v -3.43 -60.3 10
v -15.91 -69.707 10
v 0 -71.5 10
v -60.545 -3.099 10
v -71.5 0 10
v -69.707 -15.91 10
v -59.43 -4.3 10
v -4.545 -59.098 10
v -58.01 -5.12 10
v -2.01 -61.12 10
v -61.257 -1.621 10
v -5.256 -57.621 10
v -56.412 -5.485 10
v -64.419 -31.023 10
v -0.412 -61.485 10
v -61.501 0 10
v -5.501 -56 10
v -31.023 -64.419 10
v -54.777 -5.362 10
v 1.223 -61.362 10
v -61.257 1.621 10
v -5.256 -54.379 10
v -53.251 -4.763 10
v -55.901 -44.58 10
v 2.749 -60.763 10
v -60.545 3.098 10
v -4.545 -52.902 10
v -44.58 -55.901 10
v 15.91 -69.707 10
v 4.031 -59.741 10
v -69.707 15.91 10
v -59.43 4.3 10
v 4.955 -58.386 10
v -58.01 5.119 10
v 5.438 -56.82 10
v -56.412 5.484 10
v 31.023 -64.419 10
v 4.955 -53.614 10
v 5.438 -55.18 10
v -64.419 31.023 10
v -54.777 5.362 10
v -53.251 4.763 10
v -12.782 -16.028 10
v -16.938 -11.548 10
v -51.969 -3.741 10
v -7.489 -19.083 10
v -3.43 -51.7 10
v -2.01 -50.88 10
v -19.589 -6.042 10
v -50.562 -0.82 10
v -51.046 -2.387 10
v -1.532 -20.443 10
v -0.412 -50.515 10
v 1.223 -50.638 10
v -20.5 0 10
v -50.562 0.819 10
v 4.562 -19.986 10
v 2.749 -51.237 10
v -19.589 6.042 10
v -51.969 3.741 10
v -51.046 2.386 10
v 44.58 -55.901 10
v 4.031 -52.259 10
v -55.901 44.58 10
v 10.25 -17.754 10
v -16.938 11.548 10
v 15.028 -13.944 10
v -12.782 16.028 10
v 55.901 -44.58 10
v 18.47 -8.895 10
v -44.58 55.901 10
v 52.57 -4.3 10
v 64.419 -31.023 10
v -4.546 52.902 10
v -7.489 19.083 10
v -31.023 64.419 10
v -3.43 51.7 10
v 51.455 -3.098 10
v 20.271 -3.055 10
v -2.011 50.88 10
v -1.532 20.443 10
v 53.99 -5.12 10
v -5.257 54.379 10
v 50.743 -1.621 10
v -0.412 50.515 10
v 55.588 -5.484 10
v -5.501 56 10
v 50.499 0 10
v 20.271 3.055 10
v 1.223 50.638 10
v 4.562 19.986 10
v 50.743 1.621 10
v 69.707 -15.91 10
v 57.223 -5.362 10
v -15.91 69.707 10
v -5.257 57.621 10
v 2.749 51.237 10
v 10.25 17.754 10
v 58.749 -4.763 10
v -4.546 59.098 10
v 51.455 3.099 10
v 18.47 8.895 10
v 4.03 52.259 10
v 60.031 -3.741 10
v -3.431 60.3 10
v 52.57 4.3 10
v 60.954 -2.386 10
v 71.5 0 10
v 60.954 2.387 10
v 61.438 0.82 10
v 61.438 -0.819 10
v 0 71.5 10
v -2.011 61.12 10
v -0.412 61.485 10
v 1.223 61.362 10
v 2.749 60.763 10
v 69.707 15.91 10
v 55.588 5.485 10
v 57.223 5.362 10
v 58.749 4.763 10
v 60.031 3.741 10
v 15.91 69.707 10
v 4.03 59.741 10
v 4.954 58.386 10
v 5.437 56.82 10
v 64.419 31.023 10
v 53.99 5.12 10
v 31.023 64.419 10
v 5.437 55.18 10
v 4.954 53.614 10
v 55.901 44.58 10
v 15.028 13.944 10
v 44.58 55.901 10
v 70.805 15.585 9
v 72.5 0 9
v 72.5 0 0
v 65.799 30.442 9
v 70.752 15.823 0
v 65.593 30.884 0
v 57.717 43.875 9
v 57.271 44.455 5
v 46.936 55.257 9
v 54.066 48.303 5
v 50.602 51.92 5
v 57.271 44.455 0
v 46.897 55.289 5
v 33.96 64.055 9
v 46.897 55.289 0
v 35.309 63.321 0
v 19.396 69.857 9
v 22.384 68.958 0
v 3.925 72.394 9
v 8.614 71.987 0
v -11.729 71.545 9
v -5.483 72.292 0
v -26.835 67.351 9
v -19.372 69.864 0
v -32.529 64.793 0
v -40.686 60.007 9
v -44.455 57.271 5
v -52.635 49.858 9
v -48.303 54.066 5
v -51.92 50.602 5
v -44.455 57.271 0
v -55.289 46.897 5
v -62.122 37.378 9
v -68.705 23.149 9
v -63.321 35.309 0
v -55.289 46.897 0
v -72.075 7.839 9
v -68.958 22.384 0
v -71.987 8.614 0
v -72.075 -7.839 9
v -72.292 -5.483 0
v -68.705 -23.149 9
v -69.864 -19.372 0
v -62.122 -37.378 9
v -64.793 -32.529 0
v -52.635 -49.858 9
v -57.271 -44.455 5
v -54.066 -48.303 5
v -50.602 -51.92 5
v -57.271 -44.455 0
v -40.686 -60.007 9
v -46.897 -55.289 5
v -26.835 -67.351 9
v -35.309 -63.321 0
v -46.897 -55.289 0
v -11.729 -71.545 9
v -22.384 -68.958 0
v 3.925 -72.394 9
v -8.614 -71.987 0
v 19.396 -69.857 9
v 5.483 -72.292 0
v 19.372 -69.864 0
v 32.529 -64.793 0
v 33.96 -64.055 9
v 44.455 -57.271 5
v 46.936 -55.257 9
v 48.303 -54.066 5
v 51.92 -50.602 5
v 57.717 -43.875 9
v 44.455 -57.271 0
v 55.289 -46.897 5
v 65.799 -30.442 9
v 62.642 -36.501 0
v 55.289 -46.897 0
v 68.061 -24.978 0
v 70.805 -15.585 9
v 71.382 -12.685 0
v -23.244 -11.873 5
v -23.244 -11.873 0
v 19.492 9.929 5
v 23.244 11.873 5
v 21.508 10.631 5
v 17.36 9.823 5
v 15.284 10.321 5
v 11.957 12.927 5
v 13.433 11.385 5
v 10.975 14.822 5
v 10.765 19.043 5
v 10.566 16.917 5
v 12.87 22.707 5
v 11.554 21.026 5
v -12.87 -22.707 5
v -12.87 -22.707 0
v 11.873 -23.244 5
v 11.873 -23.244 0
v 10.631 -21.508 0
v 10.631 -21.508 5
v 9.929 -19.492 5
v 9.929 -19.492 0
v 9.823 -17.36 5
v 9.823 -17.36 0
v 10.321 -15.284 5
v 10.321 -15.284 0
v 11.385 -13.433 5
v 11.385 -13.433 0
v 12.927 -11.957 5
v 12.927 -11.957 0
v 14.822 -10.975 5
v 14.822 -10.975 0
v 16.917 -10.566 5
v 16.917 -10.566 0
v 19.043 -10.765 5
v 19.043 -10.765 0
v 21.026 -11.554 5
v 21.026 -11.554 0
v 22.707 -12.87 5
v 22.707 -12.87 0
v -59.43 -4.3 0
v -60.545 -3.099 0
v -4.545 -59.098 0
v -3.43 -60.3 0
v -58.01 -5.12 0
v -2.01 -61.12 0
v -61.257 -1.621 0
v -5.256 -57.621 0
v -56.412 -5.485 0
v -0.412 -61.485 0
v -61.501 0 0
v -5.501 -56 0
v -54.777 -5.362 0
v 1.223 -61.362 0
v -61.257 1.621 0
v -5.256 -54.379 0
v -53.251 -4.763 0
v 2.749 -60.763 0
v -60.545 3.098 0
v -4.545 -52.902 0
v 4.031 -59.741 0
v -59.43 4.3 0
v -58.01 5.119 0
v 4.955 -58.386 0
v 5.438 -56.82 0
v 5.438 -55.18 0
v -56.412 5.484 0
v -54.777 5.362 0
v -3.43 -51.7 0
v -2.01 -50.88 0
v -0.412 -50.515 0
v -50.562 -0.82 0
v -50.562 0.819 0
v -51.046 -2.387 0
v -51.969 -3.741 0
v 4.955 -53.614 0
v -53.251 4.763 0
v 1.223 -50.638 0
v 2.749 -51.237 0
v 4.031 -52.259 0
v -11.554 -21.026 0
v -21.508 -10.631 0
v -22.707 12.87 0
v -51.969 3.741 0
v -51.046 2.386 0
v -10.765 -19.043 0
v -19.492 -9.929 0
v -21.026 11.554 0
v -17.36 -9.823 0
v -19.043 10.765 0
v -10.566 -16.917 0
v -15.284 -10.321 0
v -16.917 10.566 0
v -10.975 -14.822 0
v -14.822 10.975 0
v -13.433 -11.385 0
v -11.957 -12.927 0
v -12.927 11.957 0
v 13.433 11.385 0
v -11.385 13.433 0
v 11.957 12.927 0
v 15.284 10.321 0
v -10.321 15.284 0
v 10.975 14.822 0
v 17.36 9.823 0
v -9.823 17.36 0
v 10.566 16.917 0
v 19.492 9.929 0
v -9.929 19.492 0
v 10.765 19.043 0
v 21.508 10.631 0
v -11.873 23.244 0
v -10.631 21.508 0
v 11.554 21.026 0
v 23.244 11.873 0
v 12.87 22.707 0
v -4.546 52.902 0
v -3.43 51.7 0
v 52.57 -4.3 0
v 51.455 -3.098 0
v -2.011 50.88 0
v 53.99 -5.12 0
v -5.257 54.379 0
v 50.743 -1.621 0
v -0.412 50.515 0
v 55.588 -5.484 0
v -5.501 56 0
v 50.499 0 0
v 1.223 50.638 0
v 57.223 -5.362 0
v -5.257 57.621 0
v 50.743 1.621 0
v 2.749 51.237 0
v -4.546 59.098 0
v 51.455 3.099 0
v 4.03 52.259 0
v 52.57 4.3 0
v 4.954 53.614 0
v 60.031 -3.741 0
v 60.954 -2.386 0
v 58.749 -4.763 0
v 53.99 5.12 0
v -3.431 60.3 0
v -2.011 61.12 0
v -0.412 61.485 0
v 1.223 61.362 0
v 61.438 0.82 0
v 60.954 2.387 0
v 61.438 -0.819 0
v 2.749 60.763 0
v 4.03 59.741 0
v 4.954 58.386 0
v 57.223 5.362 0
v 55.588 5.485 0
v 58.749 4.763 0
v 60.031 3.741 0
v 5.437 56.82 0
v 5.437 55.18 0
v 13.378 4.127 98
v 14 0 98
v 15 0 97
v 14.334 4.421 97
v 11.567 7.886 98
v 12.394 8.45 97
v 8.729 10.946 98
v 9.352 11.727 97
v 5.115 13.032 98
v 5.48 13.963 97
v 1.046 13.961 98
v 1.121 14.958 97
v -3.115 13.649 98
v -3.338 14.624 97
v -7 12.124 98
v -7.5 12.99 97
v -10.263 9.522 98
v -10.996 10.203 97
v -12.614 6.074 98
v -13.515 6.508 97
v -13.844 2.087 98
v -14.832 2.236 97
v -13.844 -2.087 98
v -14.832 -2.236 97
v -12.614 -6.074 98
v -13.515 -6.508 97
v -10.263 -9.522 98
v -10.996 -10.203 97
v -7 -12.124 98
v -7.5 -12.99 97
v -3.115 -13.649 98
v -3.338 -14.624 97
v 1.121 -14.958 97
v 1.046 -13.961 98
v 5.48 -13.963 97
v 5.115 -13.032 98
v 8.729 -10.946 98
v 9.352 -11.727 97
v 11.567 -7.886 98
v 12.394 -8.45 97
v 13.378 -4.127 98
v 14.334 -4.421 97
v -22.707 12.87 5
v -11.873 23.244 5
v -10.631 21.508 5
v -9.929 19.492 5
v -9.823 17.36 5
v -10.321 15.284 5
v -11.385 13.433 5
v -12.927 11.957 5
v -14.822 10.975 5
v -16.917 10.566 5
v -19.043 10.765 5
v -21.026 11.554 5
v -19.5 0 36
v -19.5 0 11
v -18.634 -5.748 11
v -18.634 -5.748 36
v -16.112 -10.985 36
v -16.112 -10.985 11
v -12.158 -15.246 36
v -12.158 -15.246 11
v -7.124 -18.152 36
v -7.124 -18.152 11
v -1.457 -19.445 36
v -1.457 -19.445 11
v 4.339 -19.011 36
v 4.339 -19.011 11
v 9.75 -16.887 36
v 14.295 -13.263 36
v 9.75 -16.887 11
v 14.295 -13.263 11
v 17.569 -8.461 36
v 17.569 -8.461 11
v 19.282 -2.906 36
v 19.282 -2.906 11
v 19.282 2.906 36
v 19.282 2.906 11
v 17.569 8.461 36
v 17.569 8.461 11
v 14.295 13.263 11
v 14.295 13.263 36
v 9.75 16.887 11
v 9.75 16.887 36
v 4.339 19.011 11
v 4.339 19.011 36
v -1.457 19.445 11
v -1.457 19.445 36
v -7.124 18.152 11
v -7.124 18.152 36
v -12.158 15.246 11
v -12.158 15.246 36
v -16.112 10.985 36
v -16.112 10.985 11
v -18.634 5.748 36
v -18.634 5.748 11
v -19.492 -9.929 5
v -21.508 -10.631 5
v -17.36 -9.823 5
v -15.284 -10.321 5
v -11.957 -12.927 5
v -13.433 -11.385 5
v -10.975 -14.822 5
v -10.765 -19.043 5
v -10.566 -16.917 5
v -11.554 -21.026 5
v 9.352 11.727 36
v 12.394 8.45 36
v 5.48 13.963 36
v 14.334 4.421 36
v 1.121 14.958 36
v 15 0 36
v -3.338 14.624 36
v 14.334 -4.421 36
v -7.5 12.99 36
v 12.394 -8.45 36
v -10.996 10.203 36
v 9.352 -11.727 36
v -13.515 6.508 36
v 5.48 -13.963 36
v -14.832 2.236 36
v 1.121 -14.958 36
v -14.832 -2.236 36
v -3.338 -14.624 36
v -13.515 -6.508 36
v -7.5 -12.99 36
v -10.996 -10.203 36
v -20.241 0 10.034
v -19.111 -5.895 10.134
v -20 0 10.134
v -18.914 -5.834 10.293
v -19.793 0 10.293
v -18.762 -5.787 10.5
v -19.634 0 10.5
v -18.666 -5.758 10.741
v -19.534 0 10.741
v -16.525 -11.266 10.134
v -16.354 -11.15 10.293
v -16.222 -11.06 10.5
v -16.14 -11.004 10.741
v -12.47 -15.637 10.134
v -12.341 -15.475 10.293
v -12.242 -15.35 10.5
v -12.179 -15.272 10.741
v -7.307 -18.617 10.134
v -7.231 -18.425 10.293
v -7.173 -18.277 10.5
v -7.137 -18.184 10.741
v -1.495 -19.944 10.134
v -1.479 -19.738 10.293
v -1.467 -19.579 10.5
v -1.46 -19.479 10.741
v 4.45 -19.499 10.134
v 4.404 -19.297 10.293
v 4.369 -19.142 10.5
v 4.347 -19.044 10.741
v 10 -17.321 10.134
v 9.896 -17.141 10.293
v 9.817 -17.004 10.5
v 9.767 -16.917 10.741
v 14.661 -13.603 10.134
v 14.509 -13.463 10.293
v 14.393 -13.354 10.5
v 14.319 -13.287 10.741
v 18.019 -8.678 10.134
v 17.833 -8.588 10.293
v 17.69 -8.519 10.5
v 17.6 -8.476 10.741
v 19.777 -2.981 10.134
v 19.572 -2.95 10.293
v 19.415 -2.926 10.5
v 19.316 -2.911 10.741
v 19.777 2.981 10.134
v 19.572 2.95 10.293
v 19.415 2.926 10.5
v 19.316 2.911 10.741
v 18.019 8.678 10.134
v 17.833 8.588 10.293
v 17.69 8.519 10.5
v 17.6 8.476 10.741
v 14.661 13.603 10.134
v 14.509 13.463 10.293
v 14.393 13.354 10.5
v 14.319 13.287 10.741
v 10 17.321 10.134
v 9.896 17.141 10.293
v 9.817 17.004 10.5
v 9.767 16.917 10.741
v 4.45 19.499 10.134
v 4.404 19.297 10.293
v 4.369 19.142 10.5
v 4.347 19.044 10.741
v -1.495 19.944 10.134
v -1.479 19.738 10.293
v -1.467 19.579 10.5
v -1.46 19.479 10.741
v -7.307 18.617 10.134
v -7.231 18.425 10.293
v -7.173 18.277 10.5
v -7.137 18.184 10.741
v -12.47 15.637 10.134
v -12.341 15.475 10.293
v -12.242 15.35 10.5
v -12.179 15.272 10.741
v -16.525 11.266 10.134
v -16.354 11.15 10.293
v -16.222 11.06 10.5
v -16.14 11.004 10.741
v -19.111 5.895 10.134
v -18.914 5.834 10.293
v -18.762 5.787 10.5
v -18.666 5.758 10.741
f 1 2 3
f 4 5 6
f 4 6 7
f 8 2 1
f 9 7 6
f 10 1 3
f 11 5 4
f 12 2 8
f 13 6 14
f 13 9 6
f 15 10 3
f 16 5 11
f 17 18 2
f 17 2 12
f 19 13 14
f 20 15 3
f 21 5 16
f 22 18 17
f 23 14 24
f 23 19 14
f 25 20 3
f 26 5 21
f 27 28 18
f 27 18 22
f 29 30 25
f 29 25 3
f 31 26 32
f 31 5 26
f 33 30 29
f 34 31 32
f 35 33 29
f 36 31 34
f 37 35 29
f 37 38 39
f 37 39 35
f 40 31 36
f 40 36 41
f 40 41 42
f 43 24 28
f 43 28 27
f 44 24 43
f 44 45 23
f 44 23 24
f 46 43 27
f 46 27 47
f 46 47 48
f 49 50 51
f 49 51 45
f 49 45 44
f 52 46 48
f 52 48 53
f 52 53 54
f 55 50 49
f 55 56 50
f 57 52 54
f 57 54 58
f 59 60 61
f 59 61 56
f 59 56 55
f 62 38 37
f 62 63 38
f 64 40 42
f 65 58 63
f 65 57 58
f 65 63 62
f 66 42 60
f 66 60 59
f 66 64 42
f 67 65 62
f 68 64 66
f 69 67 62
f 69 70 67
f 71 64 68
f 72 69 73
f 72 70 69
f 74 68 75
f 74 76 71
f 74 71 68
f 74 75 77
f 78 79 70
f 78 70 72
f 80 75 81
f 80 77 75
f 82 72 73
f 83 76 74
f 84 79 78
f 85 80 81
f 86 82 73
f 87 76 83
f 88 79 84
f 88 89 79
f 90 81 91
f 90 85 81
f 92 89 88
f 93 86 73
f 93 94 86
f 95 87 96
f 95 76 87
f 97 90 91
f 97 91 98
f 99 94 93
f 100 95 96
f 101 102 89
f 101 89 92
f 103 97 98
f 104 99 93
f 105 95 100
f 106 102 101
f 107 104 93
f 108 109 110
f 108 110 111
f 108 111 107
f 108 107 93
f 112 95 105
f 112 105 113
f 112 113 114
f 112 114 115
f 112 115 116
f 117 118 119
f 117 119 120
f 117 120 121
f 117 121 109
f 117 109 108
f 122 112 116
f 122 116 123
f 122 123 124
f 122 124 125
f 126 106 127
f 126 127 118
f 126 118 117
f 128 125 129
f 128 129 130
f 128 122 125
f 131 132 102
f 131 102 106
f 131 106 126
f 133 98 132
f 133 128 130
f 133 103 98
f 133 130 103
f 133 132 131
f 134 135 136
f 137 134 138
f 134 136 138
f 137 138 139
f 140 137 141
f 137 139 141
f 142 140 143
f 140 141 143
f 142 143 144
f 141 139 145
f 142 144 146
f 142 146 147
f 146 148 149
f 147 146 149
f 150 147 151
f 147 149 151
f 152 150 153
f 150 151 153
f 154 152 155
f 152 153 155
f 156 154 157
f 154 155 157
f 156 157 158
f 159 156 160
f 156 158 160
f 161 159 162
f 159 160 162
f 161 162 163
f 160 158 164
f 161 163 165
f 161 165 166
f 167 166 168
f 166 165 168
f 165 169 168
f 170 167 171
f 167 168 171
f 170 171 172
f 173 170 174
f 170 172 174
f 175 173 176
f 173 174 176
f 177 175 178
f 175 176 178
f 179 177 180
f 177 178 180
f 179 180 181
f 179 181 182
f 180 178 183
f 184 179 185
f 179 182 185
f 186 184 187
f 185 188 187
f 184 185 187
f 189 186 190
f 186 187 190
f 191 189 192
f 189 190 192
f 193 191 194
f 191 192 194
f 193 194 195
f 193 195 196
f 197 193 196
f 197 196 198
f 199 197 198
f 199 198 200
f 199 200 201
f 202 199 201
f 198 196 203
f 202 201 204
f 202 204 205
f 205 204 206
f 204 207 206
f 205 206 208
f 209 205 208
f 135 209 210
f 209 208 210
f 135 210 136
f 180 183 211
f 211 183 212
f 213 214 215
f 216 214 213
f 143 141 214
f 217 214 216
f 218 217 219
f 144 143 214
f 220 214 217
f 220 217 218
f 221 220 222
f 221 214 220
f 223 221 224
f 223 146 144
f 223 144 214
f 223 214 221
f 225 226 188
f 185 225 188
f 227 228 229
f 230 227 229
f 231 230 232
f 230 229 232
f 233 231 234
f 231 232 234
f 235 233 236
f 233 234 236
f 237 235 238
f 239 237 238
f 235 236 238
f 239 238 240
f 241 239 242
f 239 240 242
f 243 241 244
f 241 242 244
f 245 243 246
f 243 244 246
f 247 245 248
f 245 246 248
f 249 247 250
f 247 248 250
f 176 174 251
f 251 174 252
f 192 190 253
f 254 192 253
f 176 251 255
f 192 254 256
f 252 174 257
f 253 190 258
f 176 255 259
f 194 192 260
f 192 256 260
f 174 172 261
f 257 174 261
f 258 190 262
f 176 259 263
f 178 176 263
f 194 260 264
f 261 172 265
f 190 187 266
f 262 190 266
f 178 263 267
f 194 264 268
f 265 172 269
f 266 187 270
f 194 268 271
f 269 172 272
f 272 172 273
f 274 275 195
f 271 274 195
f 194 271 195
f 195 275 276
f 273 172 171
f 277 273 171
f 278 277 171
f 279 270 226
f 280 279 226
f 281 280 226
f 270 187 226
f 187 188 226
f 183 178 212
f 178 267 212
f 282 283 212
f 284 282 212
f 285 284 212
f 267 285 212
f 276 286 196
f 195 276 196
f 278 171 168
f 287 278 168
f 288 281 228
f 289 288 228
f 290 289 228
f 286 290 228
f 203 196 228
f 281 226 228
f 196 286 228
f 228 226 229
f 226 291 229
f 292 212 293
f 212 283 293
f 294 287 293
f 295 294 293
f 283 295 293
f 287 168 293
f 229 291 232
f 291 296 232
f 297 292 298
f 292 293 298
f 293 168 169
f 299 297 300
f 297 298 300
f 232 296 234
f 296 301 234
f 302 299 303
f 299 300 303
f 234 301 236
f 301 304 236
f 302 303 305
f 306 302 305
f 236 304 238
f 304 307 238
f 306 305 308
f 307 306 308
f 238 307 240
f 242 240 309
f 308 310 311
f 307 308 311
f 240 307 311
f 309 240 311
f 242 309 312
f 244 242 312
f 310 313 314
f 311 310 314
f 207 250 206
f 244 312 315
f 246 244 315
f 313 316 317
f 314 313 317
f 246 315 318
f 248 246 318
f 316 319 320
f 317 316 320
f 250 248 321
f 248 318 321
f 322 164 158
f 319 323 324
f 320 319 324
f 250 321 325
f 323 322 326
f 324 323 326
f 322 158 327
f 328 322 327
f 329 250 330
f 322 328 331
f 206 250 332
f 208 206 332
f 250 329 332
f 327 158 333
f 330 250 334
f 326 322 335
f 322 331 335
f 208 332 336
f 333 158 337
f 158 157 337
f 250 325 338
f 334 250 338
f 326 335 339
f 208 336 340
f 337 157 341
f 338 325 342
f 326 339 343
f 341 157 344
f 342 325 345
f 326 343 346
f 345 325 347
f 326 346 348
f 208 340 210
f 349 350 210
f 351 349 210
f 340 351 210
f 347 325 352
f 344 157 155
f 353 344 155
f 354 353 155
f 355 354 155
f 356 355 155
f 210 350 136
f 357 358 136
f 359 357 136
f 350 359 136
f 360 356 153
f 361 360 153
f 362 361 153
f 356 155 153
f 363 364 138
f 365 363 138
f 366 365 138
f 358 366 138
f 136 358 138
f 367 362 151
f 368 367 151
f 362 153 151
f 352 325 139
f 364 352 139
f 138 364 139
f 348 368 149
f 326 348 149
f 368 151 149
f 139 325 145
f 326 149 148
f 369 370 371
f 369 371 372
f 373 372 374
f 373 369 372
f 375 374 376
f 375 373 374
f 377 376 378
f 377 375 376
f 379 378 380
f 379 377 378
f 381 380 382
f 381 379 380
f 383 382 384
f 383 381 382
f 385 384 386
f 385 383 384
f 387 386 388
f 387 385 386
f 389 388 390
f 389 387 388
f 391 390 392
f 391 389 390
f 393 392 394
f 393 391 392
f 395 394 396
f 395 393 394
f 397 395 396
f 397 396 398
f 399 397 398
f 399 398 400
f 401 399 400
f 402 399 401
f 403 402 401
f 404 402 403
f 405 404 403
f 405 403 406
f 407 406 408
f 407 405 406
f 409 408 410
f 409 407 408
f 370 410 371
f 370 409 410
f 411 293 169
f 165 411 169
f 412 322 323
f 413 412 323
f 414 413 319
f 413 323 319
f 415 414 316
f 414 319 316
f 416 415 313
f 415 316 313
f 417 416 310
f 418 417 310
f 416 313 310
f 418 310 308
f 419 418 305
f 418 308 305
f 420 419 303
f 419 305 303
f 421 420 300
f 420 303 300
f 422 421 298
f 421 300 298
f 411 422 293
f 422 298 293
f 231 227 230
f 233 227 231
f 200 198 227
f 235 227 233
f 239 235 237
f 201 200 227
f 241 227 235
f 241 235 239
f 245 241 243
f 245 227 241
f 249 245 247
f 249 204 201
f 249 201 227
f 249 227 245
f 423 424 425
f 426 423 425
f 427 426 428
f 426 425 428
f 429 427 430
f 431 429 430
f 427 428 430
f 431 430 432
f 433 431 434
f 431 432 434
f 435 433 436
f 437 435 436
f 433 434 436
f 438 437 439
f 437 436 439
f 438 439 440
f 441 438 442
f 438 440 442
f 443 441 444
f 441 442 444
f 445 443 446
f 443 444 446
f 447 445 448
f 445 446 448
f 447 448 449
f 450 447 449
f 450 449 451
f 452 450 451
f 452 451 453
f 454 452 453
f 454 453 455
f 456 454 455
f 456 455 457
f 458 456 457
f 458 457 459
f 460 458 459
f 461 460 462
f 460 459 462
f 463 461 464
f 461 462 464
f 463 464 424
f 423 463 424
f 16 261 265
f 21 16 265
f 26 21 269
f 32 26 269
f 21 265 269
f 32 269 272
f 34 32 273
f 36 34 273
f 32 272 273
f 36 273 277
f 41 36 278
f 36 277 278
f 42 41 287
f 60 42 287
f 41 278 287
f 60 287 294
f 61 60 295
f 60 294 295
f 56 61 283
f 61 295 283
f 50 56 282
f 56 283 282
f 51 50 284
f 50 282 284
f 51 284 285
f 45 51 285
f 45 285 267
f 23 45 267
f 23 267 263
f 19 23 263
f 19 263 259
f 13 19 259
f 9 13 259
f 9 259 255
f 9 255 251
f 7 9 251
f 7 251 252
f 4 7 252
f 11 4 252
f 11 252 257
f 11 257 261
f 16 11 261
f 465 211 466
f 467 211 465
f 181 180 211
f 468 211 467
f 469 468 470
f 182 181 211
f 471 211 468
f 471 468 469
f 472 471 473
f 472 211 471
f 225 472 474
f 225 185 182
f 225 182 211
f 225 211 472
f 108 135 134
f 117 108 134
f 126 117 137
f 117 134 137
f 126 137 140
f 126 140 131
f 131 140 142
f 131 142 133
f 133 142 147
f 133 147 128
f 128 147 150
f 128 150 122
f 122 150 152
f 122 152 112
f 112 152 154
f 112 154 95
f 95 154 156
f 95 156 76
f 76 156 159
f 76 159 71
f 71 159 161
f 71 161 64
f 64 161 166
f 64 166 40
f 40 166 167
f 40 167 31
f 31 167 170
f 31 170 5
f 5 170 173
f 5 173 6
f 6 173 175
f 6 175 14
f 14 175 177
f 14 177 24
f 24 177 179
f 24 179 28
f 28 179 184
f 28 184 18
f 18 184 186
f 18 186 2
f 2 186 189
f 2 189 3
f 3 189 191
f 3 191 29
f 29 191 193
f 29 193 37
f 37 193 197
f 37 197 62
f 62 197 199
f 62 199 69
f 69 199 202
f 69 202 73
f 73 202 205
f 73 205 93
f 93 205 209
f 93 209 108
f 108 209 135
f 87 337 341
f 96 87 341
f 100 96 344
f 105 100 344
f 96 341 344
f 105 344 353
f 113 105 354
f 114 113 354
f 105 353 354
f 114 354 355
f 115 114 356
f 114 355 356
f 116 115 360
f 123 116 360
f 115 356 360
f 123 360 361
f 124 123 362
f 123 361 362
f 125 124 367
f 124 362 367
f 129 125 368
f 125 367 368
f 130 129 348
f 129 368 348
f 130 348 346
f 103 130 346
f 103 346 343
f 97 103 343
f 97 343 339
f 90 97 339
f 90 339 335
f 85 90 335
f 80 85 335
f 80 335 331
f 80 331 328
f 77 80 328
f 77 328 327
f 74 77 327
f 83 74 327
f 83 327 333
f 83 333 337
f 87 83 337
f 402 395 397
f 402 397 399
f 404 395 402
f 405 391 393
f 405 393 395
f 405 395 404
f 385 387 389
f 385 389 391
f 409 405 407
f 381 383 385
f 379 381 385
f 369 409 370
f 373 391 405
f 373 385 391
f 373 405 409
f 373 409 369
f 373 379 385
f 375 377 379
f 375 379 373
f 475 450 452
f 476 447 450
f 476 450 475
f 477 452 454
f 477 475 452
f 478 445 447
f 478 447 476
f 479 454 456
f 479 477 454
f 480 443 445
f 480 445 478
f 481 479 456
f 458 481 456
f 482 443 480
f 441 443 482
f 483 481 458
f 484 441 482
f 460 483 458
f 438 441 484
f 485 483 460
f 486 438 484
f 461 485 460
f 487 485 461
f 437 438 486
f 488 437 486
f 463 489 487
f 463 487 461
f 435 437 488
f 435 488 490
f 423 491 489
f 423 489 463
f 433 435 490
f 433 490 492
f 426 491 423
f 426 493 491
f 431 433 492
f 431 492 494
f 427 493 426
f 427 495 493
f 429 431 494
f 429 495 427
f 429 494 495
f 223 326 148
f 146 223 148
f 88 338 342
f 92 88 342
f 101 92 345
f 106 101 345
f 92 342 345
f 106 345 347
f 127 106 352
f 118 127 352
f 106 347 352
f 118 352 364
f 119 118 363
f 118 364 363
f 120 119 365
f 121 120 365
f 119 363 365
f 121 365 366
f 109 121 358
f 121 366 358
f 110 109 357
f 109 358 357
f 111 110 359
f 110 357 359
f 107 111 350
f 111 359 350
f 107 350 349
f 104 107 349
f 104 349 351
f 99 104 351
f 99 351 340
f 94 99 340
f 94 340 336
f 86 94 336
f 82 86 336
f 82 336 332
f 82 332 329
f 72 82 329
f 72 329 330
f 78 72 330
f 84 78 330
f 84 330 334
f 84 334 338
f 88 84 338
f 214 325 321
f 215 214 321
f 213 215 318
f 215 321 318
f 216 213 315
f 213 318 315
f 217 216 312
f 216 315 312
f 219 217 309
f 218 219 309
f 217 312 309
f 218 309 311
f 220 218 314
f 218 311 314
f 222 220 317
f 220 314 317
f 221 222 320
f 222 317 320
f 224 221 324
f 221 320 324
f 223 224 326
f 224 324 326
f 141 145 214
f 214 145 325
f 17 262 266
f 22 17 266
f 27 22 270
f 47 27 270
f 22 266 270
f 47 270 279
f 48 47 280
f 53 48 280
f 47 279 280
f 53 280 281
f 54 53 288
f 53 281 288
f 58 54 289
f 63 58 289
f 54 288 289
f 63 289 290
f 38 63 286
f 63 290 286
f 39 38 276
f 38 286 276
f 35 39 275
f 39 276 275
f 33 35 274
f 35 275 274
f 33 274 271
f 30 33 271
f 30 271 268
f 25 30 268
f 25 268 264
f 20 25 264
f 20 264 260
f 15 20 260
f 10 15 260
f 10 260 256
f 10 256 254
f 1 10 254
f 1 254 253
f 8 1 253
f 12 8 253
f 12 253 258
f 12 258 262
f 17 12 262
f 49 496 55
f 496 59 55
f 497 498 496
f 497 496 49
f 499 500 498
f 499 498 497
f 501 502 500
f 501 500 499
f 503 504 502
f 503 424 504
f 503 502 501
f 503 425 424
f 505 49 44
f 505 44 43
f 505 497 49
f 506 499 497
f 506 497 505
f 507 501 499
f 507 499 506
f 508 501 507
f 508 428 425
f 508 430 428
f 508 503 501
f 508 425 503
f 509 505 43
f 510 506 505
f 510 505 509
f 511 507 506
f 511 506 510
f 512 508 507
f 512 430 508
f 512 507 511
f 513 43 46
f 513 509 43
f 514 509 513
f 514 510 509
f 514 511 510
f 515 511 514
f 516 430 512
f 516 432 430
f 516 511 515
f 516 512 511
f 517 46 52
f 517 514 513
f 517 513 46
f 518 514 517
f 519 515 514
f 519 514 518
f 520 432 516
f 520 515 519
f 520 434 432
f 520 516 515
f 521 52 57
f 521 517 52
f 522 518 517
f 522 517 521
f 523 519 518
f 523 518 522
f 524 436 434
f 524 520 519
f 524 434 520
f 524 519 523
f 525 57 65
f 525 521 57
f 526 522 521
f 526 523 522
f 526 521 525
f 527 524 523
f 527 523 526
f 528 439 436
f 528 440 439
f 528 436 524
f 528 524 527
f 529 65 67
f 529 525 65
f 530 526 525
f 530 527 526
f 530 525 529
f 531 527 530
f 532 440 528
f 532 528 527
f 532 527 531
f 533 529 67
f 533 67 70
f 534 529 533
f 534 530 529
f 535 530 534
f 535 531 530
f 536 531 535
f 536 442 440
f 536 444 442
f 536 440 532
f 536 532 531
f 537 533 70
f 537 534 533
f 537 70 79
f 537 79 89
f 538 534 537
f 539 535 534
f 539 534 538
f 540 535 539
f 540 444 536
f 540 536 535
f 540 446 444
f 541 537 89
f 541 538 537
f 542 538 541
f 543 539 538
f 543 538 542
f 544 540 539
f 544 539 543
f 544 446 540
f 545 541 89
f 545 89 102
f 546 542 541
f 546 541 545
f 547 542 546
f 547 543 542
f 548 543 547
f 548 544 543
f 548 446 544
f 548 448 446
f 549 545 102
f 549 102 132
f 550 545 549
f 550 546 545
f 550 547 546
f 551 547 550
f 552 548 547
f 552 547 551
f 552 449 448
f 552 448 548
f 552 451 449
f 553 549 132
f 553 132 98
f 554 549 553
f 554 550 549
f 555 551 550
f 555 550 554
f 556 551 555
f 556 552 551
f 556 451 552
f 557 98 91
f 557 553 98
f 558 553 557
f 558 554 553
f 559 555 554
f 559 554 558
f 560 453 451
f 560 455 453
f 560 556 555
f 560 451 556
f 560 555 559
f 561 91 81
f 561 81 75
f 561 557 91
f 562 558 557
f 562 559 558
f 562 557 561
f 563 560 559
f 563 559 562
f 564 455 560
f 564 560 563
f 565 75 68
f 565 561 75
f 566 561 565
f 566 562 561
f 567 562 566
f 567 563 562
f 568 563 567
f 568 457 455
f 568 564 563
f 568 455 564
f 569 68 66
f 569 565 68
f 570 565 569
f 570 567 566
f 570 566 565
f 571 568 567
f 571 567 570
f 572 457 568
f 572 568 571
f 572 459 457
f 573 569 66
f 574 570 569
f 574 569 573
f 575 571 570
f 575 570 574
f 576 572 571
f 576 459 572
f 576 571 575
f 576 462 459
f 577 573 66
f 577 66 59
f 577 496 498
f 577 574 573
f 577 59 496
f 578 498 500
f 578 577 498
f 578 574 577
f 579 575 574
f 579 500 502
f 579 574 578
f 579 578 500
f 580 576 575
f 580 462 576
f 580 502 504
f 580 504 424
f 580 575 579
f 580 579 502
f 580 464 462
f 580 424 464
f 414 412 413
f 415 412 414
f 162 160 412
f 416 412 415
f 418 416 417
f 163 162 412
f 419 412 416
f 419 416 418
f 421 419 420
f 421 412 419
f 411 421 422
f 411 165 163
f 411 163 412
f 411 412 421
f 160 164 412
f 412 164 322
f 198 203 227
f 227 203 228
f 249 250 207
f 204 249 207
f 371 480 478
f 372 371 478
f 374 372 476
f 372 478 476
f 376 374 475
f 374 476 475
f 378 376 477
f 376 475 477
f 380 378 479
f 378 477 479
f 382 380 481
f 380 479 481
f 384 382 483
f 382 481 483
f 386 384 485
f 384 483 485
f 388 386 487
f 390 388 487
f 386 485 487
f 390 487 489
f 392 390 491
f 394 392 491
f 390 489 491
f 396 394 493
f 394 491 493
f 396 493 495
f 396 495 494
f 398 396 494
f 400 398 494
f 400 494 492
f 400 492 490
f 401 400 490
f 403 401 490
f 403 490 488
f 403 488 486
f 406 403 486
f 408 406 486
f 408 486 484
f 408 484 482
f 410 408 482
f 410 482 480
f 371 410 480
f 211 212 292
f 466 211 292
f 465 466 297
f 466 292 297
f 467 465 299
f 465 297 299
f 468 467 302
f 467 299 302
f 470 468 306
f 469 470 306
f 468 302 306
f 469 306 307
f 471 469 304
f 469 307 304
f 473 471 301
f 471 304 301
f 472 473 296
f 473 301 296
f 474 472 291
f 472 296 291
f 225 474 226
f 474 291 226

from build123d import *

# Parameters (mm, degrees)
SCHIZZO1_R                  = 72.5
ESTRUSIONE1_DEPTH           = 10
SCHIZZO2_R                  = 19.5
ESTRUSIONE2_DEPTH           = 26
ESTRUSIONE5_DEPTH           = 62
ESTRUSIONE5_DEPTH_BACK      = 5
SCHIZZO5_R                  = 15
SMUSSO2_SIZE                = 1
RACCORDO1_R                 = 1
ESTRUSIONE3_DEPTH           = 5
RIPETIZIONECIRCOLARE1_COUNT = 4
SMUSSO3_SIZE                = 1
M10_GIOCHI_FORO1_D          = 11


with BuildPart() as part:
    # Schizzo1 → Estrusione1 (new body)
    with BuildSketch(Plane.XY):
        Circle(SCHIZZO1_R)
    extrude(amount=ESTRUSIONE1_DEPTH)

    # Schizzo2 → Estrusione2 (add)
    with BuildSketch(Plane.XY.offset(10)):
        with Locations(Location((0, 0, 0), (0, 0, 180))):
            Circle(SCHIZZO2_R)
    extrude(amount=ESTRUSIONE2_DEPTH)

    # Schizzo5 → Estrusione5 (add, two sides: drawn at the far end of the back side and taken through both)
    with BuildSketch(Plane.XY.offset(36).offset(-ESTRUSIONE5_DEPTH_BACK)):
        Circle(SCHIZZO5_R)
    extrude(amount=ESTRUSIONE5_DEPTH + ESTRUSIONE5_DEPTH_BACK)

    # Smusso2
    smusso2_edges = [part.edges().sort_by_distance(p)[0] for p in [
        (-72.5, 0, 10),
    ]]
    chamfer(smusso2_edges, length=SMUSSO2_SIZE)

    # Raccordo1
    raccordo1_edges = [part.edges().sort_by_distance(p)[0] for p in [
        (19.5, 0, 10),
    ]]
    fillet(raccordo1_edges, radius=RACCORDO1_R)

    # Schizzo3 → Estrusione3 (cut)
    with BuildSketch(Plane(origin=(0, 0, 0), x_dir=(-1, 0, 0), z_dir=(0, 0, -1))):
        with BuildLine():
            Line((-57.271310306, 44.454999897), (-23.243993136, 11.87294332))
            ThreePointArc((-23.243993136, 11.87294332), (-12.639887246, 12.103026498), (-12.869970423, 22.707132388))
            Line((-12.869970423, 22.707132388), (-46.897287593, 55.289188965))
            ThreePointArc((-46.897287593, 55.289188965), (-52.365247161, 50.141109778), (-57.271310306, 44.454999897))
        make_face()
    estrusione3 = extrude(amount=-ESTRUSIONE3_DEPTH, mode=Mode.SUBTRACT)

    # RipetizioneCircolare1: Estrusione3 ×4 about axis
    ripetizionecircolare1_axis = Axis((0, 0, 0), (0, 0, 1))
    for i in range(1, RIPETIZIONECIRCOLARE1_COUNT):
        add(estrusione3.rotate(ripetizionecircolare1_axis, i * 360 / RIPETIZIONECIRCOLARE1_COUNT), mode=Mode.SUBTRACT)

    # Smusso3
    smusso3_edges = [part.edges().sort_by_distance(p)[0] for p in [
        (-15, 0, 98),
    ]]
    chamfer(smusso3_edges, length=SMUSSO3_SIZE)

    # M10 Giochi foro1 (through all)
    with Locations(Plane(origin=(8.775277543, -26.129129274, 10), x_dir=(0.9999999999861032, 5.271953212239764e-06, 0), z_dir=(0, 0, 1))):
        with Locations((-8.776166907, 82.129175527), (-8.776166907, -29.870824473), (-64.776166907, 26.129175527), (47.223833093, 26.129175527)):
            Hole(M10_GIOCHI_FORO1_D / 2)


solid = part.part
